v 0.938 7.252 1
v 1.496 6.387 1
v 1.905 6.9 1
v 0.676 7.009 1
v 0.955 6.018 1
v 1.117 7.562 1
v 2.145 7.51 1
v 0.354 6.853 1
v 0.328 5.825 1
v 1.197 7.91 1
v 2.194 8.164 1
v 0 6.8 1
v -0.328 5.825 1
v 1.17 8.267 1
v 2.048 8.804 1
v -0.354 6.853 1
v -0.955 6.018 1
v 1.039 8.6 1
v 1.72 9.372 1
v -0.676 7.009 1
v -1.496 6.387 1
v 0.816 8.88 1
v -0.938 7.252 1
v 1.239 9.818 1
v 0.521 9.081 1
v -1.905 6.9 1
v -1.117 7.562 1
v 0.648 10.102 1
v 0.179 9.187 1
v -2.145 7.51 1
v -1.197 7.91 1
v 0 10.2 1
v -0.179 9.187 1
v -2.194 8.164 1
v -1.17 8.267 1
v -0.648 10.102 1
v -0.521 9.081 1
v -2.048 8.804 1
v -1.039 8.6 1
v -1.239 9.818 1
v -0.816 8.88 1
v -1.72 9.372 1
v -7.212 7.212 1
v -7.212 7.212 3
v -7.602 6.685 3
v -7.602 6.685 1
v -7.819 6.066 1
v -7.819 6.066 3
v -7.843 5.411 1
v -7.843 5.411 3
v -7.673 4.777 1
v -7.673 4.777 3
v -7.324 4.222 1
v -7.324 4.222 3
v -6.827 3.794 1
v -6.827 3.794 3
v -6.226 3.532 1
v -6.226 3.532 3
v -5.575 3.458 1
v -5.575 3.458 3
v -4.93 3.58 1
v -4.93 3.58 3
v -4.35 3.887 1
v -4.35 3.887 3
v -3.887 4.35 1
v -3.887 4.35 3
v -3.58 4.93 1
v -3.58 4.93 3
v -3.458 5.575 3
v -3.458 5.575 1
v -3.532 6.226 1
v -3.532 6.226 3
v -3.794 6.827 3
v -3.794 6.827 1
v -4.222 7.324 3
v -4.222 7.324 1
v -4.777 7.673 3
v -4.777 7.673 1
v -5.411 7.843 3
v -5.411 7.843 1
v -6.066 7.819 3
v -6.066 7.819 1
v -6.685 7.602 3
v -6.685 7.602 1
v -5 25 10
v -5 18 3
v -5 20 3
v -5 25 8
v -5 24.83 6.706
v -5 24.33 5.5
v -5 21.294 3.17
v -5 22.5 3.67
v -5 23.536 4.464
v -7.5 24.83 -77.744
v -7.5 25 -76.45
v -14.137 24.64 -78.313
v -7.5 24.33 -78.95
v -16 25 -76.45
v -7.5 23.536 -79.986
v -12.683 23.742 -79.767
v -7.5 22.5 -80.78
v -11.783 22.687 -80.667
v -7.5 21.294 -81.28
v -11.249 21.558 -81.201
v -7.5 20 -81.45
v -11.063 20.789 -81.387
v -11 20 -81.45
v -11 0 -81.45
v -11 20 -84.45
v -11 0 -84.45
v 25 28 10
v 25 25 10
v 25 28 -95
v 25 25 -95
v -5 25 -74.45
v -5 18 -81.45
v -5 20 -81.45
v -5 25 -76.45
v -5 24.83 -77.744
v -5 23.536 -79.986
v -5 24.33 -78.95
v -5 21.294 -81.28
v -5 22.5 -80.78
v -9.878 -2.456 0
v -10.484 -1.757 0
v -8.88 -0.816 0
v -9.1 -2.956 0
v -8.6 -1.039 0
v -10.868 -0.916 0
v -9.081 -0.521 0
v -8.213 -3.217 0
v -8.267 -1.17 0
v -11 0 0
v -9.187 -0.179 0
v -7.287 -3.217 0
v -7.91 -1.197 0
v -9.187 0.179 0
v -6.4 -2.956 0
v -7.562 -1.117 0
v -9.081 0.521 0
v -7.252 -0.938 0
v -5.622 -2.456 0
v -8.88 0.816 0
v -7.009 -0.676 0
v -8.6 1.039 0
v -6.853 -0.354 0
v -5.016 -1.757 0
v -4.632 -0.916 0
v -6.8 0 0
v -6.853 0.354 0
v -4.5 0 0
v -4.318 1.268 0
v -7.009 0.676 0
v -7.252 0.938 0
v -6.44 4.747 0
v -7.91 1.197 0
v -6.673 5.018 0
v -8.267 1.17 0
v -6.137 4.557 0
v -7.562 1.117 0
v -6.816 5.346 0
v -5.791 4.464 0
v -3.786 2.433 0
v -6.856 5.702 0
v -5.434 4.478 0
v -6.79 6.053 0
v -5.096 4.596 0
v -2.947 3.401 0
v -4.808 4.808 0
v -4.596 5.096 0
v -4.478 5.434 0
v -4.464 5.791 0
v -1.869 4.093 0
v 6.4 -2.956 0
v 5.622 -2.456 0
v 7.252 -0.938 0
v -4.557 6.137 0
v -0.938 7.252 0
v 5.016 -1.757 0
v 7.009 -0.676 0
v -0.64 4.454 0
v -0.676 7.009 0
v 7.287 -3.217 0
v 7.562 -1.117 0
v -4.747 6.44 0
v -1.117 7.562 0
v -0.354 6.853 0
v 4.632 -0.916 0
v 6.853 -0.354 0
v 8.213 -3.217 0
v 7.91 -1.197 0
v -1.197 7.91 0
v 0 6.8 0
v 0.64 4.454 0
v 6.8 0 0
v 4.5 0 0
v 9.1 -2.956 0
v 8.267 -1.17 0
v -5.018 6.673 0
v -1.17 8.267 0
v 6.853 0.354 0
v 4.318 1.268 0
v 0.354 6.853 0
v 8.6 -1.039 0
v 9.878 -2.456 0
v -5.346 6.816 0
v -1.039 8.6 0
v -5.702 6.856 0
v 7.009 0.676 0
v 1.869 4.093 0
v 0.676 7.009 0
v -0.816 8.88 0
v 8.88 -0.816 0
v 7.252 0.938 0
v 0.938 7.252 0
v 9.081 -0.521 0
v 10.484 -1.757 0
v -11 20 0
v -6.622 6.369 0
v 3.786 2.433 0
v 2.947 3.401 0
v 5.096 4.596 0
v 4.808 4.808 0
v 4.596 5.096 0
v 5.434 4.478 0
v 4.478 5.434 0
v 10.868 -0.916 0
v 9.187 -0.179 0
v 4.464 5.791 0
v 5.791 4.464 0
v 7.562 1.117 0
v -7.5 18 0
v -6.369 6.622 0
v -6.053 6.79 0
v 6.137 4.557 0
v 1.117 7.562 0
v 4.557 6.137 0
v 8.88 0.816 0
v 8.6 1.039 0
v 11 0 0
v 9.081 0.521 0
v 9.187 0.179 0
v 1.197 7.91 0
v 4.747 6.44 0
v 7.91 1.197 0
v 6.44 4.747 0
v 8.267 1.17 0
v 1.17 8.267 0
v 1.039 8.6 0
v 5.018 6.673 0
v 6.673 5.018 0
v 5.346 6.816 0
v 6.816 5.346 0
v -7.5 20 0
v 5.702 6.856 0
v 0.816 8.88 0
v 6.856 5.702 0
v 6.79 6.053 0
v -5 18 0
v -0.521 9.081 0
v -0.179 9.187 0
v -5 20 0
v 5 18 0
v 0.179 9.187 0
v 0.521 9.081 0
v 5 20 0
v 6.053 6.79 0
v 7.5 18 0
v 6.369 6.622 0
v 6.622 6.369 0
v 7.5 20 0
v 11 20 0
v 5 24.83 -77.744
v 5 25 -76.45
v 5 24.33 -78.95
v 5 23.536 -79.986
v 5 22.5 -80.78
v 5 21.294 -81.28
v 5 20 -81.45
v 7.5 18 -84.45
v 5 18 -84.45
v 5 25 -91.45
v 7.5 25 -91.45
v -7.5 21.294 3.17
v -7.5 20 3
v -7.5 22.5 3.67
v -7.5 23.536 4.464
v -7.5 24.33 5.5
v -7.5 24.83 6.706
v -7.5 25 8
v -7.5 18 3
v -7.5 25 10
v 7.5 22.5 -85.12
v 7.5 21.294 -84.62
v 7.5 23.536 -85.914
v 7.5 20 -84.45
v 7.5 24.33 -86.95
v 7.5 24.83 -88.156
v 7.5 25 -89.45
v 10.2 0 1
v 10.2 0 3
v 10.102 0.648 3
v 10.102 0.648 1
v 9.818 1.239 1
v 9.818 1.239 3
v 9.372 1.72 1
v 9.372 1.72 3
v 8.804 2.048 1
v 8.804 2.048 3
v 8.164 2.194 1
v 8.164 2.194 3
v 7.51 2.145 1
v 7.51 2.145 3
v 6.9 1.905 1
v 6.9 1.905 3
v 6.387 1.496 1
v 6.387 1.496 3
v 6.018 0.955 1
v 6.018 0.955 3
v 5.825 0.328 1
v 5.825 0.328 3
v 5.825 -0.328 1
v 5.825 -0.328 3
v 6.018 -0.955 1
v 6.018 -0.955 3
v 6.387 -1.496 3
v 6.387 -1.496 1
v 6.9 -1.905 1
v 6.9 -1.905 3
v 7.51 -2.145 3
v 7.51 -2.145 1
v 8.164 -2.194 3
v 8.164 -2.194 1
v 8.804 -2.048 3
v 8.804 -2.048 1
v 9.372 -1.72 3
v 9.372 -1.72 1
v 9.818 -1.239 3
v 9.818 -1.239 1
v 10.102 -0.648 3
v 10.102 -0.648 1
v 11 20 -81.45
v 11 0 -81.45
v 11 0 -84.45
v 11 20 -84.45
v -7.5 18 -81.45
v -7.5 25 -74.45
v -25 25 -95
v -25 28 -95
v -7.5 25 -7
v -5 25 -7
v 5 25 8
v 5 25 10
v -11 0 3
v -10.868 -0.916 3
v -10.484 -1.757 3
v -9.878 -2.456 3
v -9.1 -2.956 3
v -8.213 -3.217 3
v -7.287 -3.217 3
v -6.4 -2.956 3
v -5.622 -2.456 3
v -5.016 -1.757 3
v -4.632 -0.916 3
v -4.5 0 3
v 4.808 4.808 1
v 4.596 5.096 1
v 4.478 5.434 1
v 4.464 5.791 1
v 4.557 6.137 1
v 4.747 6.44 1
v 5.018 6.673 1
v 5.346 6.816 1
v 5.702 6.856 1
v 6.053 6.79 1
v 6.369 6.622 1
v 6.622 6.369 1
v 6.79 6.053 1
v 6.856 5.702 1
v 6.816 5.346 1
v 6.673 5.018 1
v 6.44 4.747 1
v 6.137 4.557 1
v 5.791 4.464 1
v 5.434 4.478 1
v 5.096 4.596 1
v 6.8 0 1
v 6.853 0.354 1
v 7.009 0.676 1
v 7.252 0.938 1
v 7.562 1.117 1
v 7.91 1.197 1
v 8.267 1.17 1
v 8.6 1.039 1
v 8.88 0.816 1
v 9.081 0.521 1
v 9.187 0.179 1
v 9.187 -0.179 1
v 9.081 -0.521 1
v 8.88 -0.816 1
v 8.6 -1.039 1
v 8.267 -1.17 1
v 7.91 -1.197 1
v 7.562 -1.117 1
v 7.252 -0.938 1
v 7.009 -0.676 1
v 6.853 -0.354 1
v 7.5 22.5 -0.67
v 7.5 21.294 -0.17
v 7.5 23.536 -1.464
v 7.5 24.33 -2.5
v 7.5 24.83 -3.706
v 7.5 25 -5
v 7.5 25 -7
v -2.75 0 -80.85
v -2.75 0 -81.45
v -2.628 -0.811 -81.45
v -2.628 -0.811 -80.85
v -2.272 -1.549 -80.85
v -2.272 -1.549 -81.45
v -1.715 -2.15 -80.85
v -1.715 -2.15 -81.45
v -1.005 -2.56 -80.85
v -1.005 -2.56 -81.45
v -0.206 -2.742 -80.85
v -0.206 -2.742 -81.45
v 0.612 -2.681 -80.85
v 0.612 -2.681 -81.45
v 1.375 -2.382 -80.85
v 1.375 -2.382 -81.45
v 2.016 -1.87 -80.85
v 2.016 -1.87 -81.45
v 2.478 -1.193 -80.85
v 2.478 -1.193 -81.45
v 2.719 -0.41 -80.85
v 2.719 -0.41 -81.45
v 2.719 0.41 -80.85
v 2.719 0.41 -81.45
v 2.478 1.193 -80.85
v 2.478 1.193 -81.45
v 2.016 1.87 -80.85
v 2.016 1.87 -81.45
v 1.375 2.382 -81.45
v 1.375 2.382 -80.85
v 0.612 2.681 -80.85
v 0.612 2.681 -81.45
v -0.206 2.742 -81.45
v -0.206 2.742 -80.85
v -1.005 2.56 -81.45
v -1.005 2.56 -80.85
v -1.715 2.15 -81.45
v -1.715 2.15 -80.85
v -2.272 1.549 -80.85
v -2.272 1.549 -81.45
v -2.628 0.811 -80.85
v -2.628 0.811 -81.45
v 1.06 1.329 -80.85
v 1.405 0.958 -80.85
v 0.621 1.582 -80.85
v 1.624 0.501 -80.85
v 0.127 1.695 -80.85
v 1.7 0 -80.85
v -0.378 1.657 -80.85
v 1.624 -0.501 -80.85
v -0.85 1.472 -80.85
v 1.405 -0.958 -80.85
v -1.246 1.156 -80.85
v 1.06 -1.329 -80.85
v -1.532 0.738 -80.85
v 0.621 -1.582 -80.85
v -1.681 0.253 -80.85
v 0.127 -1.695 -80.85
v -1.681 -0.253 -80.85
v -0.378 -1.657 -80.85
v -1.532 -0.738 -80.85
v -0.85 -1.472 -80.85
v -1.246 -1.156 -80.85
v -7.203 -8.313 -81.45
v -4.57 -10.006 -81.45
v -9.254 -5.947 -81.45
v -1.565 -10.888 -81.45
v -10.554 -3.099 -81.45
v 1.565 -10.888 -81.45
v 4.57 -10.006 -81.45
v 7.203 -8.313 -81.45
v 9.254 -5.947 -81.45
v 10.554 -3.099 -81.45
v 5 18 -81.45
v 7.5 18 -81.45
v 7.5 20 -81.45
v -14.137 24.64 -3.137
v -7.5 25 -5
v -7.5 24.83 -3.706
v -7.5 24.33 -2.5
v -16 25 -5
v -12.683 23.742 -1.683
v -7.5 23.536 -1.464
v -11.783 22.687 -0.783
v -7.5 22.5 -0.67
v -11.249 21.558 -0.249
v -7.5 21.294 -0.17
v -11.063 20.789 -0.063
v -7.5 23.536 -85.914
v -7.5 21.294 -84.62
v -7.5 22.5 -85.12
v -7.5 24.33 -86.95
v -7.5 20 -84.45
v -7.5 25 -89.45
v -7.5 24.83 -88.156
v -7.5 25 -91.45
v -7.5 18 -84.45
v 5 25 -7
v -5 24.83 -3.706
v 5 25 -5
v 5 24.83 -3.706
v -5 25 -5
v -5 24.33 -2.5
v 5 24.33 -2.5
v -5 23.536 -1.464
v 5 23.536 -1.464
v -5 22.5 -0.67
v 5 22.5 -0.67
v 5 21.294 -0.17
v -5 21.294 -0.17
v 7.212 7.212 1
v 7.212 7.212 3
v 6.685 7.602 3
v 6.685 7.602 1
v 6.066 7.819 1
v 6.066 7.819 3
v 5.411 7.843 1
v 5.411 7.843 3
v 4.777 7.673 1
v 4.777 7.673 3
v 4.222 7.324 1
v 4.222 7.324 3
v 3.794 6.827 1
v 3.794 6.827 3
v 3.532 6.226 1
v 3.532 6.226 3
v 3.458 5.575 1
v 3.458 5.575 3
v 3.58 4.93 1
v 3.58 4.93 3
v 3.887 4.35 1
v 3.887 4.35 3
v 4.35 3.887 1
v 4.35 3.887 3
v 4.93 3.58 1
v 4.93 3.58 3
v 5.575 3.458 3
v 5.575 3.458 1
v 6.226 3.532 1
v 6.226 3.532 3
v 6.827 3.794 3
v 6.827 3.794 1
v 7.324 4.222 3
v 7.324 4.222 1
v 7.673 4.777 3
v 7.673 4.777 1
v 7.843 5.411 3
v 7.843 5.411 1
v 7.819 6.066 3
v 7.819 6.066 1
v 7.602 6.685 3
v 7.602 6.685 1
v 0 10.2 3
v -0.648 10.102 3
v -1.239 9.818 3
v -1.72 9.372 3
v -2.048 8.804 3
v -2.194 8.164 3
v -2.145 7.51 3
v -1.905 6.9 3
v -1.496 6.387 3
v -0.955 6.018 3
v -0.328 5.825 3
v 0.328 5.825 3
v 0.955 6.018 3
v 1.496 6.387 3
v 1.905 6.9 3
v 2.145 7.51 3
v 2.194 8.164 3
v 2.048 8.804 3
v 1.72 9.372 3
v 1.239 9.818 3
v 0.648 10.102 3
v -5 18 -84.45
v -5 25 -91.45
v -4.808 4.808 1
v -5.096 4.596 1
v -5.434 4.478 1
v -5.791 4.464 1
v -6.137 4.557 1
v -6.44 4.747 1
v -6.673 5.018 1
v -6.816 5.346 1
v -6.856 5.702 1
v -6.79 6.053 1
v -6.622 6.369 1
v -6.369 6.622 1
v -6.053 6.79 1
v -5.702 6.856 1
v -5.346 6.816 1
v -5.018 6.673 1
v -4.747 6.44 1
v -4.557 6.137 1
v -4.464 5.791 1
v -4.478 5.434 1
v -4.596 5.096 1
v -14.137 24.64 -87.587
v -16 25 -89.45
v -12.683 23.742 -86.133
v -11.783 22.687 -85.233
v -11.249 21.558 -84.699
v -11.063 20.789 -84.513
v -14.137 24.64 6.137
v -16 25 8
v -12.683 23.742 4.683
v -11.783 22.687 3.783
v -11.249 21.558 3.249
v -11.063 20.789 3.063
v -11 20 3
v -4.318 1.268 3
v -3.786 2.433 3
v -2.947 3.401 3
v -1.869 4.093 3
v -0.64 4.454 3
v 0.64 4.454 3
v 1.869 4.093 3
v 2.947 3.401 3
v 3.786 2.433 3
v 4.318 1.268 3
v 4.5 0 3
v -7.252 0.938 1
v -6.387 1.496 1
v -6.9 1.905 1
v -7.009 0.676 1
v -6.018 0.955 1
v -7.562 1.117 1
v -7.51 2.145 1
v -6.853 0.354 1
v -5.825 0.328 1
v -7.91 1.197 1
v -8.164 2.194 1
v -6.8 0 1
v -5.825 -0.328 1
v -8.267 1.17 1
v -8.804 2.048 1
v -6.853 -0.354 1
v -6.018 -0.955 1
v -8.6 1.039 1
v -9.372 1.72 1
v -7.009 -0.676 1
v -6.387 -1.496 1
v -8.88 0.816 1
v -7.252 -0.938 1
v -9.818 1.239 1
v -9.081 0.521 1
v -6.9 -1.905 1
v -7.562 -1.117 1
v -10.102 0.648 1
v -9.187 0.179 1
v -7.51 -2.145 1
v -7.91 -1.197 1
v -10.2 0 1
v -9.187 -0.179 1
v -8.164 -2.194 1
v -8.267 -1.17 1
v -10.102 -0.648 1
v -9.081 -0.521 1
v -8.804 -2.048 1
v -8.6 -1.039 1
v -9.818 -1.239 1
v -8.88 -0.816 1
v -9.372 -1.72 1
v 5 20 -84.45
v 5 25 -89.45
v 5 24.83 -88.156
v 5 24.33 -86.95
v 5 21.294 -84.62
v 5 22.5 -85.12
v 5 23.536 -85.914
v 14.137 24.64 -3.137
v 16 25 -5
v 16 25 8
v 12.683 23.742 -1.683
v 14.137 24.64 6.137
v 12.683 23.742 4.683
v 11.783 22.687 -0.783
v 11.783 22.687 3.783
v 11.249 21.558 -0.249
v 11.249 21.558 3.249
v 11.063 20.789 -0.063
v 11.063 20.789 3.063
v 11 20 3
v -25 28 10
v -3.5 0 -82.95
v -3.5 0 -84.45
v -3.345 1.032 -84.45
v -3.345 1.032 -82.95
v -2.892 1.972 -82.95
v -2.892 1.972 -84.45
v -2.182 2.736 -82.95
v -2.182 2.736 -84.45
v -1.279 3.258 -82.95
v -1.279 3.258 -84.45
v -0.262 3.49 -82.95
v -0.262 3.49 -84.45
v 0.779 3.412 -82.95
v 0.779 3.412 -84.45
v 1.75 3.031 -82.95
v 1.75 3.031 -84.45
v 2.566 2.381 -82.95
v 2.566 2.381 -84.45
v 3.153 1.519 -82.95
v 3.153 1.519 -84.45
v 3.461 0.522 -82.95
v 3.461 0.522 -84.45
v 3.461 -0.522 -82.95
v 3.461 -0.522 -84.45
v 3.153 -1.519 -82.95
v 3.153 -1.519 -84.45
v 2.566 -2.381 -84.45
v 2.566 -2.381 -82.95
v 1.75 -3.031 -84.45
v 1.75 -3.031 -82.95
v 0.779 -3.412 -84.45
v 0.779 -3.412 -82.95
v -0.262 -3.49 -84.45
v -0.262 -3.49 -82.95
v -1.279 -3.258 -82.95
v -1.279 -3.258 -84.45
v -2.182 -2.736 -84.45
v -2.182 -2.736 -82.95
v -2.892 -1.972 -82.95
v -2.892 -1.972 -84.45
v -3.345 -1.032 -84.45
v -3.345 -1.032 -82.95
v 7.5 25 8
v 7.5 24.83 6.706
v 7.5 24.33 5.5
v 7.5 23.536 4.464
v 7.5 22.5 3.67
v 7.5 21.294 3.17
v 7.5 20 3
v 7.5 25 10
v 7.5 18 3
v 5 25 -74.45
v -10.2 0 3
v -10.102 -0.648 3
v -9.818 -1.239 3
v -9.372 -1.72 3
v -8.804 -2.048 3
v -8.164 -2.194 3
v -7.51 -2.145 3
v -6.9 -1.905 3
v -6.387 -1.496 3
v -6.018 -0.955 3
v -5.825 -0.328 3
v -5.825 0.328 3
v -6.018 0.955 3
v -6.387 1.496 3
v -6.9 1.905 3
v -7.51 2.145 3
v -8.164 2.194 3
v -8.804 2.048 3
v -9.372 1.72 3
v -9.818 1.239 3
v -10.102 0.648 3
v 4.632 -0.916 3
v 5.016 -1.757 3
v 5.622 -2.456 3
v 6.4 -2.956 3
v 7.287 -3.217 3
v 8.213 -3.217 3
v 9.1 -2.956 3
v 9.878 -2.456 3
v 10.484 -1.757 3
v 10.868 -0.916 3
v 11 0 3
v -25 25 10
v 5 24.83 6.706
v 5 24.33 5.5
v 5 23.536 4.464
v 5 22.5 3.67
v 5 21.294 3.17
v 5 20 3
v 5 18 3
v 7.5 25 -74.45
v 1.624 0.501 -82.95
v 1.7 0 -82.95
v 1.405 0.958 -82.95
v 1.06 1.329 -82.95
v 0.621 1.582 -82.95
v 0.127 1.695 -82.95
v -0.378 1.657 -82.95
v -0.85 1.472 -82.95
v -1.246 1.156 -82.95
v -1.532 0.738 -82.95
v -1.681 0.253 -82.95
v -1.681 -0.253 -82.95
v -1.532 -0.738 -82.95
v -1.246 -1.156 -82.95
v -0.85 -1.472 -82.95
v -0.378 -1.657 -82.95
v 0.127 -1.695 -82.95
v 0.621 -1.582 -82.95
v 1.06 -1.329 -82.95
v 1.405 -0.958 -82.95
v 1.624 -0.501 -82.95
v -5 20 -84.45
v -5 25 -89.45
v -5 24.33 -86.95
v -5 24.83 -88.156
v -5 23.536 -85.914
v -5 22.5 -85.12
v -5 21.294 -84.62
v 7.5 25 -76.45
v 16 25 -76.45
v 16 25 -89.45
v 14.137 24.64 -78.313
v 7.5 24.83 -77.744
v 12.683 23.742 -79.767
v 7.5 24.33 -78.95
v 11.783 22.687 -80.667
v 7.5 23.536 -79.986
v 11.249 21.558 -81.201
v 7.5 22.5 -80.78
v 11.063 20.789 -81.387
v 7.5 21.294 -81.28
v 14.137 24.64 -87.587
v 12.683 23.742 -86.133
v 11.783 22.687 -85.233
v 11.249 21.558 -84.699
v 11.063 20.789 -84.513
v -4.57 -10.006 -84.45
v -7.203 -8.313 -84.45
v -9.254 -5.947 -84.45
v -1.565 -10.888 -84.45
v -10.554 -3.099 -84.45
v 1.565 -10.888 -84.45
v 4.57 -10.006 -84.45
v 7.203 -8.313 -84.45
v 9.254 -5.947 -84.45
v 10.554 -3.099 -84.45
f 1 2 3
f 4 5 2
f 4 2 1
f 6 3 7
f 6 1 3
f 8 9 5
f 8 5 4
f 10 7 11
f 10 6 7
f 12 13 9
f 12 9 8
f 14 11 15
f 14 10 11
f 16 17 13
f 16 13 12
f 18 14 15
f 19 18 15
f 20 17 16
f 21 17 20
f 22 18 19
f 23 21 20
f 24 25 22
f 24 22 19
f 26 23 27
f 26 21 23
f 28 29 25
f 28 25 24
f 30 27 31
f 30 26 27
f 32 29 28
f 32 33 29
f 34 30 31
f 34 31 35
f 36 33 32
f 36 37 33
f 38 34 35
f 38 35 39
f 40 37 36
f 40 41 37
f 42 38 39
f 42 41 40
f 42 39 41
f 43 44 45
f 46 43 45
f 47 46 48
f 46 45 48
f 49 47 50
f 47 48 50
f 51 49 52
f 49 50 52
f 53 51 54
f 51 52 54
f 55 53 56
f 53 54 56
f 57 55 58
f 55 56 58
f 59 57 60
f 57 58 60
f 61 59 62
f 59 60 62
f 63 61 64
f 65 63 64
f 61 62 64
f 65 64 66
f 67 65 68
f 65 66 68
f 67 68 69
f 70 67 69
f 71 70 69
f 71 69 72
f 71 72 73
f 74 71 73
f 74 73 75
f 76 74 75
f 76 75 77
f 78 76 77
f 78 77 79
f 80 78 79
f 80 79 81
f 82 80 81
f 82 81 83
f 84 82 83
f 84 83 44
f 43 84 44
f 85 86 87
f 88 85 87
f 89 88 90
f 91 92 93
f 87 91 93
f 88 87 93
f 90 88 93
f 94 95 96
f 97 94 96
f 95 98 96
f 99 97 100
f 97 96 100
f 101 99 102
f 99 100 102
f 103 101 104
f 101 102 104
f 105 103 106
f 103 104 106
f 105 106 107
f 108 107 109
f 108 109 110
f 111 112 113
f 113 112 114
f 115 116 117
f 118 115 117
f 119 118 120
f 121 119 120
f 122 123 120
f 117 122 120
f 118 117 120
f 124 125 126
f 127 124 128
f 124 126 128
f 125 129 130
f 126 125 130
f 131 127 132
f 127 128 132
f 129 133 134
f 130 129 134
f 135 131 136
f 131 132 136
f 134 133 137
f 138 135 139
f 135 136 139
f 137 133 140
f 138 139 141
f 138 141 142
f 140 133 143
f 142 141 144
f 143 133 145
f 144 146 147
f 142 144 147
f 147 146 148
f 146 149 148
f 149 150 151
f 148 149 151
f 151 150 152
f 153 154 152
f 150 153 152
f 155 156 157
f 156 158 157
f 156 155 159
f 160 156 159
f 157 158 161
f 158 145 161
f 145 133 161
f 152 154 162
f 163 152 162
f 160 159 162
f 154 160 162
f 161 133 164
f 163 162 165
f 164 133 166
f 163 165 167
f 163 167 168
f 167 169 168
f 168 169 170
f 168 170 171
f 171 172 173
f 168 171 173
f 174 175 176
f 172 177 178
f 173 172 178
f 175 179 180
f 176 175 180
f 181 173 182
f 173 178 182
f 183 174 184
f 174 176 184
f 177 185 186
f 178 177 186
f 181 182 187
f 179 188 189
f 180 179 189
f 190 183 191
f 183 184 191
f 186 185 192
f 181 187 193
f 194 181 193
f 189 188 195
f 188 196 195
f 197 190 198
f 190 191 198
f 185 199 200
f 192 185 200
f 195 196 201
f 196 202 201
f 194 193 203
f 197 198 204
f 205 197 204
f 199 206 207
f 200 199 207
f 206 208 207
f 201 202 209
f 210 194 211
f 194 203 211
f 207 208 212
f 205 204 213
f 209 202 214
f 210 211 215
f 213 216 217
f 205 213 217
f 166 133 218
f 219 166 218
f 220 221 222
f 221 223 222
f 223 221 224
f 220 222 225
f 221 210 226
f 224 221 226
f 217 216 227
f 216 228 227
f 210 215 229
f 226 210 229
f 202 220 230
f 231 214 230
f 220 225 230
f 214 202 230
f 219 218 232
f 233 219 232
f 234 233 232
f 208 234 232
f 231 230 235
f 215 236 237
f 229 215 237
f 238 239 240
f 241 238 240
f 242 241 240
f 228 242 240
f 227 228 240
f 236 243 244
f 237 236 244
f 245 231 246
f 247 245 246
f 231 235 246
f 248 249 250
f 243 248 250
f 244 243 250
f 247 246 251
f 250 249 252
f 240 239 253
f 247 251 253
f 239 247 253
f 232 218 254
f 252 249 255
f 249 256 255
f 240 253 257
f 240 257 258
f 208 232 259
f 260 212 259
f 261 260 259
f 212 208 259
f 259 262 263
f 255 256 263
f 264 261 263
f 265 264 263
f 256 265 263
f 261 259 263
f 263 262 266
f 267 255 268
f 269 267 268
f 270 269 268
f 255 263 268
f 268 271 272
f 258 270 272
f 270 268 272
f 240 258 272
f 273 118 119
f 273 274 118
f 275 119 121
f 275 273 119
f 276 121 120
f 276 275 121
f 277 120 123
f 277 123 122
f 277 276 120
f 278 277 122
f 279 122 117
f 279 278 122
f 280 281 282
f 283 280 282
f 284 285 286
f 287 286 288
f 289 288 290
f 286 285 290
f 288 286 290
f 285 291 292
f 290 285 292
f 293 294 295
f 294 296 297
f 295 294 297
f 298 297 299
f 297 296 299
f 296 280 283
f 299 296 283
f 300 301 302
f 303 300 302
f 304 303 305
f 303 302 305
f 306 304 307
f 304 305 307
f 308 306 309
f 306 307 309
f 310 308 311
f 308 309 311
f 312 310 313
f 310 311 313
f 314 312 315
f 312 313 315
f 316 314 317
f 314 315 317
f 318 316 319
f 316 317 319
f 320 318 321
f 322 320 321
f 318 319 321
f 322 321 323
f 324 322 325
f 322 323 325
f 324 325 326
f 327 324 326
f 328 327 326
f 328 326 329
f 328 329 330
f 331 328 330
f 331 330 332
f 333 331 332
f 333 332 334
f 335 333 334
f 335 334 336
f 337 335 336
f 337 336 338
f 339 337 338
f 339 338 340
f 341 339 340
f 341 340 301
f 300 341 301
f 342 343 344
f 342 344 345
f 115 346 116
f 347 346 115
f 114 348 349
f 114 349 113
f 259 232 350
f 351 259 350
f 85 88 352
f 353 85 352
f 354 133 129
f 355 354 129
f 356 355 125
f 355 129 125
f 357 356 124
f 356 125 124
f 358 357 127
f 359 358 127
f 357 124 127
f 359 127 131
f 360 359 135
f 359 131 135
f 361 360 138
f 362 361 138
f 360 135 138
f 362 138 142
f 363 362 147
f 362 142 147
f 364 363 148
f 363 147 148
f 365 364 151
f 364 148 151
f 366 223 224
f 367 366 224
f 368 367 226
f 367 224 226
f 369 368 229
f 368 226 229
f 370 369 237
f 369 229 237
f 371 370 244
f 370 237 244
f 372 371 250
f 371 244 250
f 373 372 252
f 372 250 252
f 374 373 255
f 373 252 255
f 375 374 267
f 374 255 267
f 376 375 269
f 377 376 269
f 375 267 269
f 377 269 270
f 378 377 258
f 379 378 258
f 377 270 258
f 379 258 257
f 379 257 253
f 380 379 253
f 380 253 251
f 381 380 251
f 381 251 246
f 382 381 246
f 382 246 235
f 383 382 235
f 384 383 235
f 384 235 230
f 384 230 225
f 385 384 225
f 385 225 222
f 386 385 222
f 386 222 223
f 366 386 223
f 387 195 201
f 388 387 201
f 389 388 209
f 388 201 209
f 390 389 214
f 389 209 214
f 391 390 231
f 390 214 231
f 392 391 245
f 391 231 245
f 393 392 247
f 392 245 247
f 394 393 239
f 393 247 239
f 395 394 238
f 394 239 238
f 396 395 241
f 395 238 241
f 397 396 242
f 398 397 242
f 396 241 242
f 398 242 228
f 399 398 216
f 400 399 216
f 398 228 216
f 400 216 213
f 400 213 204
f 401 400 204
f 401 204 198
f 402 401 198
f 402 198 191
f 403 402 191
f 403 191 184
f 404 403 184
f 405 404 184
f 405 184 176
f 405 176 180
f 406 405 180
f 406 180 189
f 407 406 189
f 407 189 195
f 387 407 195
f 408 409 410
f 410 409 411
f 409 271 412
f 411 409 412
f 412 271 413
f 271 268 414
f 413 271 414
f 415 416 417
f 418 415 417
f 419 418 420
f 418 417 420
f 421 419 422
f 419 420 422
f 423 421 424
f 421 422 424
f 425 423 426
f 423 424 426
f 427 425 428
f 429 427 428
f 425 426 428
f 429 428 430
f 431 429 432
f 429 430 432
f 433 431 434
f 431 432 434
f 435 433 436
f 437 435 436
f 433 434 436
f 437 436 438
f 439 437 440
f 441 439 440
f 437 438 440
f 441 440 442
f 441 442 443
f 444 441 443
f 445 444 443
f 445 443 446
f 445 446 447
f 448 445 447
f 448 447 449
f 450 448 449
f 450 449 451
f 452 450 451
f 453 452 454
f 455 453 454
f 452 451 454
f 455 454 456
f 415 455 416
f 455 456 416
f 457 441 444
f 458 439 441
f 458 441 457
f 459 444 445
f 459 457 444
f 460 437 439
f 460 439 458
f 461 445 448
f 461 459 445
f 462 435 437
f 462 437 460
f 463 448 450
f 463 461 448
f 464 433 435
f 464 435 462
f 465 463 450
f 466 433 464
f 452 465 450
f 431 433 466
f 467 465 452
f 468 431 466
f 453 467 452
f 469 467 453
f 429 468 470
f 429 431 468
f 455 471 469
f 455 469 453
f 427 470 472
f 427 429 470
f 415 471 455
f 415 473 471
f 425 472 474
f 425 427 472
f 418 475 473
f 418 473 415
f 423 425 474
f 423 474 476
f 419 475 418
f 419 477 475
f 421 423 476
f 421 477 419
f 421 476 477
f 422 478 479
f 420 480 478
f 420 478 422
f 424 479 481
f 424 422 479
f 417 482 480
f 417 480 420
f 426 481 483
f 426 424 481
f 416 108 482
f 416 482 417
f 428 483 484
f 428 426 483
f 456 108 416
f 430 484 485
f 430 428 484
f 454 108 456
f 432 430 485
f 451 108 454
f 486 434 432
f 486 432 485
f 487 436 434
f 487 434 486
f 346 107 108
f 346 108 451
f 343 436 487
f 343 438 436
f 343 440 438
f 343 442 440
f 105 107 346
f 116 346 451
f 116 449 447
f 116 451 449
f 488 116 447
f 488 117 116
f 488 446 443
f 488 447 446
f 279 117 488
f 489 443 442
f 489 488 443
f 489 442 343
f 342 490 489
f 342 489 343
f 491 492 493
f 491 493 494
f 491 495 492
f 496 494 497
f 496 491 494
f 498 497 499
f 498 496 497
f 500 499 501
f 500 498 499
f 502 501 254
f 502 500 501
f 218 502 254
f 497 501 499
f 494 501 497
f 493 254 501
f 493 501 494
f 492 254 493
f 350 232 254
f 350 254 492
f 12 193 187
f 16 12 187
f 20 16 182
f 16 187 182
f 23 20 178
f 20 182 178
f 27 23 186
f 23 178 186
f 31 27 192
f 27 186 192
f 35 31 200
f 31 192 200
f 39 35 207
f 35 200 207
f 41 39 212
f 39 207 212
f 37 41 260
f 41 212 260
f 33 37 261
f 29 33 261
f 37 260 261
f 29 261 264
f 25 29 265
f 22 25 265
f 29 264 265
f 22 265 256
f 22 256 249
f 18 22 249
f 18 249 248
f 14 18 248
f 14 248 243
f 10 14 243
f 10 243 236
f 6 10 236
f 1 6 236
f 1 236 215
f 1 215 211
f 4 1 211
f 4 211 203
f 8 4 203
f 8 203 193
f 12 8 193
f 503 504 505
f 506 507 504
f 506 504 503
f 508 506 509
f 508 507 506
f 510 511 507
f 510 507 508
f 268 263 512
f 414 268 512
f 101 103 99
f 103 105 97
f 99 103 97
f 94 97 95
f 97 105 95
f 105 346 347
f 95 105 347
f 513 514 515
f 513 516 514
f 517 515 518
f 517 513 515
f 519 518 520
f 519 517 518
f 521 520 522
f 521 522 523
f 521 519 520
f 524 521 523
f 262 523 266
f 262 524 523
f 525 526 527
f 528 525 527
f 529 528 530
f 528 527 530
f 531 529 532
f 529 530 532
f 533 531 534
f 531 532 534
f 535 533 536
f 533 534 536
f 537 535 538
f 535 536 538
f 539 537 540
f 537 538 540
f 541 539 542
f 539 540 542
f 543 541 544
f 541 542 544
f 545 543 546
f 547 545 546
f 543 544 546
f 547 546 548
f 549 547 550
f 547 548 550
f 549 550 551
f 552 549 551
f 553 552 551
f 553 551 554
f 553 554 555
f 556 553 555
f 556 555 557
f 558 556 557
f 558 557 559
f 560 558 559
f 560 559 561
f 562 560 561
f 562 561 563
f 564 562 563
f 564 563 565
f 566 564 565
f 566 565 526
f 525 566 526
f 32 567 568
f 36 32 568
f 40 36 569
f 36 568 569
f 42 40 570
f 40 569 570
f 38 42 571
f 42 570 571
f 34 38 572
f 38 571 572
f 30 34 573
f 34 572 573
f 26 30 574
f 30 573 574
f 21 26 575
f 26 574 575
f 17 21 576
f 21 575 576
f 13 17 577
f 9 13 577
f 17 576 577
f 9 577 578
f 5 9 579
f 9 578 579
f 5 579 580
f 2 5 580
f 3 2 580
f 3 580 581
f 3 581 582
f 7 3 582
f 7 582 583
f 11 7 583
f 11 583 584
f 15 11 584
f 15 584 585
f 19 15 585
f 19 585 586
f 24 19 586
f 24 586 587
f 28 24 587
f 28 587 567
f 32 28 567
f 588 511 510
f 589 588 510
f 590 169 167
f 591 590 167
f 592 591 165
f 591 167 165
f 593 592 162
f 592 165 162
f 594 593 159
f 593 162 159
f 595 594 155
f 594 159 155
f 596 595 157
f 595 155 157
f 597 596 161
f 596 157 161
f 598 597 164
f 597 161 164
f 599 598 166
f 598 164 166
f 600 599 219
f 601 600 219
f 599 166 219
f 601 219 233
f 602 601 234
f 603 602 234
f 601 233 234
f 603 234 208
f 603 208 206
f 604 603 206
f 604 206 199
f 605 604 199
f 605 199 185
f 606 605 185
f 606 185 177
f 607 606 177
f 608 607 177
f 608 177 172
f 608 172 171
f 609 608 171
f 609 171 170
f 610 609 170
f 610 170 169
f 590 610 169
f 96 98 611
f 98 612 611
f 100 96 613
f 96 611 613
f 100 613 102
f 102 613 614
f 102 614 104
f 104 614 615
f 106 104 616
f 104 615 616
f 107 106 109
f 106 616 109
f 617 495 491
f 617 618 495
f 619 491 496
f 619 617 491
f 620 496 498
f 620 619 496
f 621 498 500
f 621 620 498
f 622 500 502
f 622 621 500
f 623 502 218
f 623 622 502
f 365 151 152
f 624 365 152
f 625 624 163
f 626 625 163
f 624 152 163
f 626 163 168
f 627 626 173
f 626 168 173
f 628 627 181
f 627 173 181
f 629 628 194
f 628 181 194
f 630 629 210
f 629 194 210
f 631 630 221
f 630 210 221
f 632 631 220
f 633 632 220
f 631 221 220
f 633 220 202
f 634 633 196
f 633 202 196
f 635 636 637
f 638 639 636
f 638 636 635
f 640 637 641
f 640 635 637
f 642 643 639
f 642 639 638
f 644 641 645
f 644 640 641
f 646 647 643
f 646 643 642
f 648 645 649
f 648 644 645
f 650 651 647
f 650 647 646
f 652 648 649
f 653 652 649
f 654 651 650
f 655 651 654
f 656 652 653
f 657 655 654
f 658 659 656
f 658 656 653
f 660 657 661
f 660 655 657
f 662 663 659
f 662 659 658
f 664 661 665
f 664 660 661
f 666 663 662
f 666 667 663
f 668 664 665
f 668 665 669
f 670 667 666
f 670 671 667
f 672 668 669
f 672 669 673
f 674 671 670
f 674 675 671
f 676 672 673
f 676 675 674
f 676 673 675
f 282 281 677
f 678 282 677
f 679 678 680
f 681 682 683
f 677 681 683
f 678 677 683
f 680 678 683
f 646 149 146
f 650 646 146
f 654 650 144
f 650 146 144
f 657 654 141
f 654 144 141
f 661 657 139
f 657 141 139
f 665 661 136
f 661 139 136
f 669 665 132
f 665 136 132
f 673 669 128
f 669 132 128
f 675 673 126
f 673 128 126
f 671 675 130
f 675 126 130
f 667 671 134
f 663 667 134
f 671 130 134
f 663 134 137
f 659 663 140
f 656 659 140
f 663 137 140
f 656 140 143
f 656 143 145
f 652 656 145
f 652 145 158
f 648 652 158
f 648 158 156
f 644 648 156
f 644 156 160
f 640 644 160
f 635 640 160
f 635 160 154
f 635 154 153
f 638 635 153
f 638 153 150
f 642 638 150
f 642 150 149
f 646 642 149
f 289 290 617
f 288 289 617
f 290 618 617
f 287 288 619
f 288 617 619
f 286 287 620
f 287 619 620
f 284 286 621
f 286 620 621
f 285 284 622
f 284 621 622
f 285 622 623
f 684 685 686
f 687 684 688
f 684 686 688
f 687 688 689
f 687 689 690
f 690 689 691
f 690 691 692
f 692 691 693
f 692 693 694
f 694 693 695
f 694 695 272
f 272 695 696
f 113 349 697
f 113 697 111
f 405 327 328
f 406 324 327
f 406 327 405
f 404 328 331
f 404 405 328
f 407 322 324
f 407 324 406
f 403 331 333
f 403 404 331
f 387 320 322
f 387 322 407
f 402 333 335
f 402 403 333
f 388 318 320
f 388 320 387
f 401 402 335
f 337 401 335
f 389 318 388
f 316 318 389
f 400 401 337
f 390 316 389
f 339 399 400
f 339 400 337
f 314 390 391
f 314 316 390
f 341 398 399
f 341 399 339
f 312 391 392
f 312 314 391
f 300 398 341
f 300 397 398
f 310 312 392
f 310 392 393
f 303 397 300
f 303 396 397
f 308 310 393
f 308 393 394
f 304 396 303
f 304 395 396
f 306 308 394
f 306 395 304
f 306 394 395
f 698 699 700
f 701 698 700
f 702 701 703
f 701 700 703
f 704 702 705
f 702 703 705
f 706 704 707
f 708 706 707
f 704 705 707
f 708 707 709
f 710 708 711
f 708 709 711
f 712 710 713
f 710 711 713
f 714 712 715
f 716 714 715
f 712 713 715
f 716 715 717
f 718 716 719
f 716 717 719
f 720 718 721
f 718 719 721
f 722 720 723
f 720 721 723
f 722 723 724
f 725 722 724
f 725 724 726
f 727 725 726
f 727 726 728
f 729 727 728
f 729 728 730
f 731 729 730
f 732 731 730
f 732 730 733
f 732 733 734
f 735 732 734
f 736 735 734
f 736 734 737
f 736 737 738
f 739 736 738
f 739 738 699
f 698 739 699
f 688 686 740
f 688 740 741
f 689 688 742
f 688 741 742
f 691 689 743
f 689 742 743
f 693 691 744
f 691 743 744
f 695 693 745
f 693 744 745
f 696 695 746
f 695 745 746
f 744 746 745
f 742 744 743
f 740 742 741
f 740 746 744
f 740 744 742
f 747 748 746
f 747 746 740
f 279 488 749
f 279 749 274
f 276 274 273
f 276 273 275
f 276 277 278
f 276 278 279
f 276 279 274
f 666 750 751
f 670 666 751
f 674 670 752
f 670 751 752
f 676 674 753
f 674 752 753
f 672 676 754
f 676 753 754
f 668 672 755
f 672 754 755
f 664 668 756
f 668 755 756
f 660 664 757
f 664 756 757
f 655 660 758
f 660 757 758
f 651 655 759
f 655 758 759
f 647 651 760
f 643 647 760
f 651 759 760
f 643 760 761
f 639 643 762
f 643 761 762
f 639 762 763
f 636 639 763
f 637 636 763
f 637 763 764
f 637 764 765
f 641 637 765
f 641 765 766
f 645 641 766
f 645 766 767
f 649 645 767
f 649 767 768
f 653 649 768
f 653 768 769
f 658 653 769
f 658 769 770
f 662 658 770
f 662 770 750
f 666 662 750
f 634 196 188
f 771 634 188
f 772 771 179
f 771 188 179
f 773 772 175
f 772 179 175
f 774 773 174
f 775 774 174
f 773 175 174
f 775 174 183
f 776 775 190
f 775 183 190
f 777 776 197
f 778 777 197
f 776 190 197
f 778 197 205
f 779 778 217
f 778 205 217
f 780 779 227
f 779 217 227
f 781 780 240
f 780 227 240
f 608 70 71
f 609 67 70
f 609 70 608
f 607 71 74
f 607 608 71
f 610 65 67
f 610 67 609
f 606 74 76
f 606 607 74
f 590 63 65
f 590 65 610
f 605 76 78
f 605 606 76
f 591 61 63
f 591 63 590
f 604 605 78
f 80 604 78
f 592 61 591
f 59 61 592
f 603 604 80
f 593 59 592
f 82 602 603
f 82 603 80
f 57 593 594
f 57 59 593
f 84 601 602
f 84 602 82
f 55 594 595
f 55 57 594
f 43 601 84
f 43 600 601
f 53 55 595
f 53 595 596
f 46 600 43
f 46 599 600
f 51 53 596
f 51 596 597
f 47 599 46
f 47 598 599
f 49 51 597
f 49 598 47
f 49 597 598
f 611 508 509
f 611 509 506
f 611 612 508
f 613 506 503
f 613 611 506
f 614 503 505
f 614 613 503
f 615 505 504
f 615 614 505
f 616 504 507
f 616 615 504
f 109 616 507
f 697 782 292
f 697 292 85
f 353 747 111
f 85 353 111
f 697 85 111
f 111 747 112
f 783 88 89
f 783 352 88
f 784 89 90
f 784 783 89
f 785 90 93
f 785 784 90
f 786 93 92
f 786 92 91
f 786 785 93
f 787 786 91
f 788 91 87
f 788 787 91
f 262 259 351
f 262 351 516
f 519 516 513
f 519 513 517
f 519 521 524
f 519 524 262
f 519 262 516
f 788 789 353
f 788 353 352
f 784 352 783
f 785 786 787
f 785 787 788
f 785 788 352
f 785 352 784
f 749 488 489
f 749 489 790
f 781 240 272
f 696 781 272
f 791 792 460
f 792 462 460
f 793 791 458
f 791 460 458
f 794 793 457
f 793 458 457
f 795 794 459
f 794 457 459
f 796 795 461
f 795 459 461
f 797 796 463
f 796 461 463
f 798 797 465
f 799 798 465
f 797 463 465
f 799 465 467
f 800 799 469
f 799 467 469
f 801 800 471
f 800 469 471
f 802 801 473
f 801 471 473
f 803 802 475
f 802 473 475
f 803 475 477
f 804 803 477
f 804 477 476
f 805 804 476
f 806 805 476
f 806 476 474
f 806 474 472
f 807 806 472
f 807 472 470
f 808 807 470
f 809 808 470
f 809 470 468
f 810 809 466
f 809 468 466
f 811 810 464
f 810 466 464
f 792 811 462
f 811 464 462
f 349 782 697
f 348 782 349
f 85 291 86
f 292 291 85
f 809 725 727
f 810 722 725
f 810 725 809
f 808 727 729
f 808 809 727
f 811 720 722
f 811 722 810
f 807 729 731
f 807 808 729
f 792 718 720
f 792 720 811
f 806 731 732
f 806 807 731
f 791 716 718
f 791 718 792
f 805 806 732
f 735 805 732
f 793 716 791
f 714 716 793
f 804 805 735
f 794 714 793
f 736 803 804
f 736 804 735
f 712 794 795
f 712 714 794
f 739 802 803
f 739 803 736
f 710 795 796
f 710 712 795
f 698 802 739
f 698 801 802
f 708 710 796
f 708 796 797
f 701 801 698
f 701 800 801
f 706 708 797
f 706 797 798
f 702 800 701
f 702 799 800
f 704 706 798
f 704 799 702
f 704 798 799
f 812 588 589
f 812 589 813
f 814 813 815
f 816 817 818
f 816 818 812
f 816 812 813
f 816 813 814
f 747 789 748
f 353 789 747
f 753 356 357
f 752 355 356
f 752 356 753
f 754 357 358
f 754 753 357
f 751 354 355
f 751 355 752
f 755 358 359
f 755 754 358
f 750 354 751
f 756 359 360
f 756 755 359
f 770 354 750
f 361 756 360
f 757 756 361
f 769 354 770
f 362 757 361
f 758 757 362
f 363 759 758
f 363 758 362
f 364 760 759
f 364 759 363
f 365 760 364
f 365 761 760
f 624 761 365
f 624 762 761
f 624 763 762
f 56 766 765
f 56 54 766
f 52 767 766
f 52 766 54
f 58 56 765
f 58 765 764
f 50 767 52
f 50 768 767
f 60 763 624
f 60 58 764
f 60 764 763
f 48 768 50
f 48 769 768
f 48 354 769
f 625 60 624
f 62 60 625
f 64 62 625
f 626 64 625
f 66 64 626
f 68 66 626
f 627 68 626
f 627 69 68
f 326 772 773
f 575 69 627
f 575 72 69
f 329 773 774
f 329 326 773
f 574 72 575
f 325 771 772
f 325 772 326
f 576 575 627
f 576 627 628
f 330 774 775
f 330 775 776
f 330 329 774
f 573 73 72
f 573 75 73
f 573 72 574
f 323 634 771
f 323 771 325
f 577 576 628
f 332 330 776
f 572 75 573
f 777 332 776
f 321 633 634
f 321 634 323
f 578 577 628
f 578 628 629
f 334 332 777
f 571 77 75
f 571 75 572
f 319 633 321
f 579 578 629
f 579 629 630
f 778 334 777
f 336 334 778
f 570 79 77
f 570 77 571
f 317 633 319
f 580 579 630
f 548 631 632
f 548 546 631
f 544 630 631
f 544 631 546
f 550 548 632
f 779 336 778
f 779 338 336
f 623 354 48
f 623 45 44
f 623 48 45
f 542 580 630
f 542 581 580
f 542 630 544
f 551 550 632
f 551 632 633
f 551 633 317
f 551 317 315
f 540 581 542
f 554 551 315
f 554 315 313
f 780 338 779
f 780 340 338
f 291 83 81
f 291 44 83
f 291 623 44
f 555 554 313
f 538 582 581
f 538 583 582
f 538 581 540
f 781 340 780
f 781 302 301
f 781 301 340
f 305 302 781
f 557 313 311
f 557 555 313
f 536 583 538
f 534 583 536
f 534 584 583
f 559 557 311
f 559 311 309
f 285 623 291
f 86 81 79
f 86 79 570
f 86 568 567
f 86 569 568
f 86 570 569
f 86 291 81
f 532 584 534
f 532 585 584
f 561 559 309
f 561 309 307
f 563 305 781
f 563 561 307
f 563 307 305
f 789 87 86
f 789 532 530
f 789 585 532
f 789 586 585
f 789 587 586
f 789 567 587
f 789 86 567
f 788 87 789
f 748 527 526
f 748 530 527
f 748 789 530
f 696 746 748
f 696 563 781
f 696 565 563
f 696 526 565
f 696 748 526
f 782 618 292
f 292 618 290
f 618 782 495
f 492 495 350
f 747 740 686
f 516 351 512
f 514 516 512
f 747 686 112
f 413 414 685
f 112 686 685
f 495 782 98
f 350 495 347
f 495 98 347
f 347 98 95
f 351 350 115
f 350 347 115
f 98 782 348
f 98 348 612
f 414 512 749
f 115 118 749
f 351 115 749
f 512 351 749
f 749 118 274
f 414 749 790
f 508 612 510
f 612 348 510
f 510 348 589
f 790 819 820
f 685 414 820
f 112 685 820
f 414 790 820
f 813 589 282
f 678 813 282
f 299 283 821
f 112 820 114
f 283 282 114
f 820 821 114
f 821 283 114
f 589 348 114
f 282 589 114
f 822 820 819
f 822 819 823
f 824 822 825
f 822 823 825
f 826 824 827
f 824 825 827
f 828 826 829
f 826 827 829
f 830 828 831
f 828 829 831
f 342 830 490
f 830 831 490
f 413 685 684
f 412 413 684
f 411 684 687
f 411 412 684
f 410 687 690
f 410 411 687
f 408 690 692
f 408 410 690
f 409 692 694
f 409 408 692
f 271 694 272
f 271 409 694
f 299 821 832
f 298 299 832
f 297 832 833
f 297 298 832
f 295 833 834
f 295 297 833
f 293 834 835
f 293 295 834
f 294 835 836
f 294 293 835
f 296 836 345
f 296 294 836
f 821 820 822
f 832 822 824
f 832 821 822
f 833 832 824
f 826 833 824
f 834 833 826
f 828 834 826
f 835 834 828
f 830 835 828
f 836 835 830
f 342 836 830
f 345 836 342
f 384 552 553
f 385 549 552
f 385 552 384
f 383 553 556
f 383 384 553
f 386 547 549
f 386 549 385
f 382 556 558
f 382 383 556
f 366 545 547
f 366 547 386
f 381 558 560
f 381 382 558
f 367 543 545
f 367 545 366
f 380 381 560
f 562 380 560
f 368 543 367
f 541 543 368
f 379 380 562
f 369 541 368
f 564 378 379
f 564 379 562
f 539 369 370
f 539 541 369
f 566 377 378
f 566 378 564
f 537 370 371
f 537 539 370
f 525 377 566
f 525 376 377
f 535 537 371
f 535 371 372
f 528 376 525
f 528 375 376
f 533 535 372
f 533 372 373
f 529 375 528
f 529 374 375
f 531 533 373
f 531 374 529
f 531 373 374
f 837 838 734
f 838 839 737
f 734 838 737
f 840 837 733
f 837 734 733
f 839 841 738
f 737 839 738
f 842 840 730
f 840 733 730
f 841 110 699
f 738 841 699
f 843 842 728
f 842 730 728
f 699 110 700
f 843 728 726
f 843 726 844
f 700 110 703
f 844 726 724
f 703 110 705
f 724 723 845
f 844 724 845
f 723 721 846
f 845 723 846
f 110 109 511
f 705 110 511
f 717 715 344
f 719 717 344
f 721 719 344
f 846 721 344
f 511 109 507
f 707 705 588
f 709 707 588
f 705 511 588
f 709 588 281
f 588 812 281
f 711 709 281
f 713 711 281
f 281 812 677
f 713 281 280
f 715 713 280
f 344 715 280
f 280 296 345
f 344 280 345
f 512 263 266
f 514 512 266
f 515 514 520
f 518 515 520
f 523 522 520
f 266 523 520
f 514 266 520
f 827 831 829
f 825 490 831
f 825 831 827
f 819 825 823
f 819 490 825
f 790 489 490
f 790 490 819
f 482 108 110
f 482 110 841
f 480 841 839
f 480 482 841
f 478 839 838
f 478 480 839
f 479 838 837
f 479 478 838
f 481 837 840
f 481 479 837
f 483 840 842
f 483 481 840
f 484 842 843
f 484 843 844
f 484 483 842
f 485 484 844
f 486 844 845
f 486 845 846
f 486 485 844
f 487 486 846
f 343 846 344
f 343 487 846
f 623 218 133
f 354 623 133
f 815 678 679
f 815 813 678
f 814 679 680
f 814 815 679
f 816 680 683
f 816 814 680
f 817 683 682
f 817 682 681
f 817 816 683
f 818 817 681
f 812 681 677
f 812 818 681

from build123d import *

# Parameters (mm, degrees)
RESSALTO_EXTRUS_O1_DEPTH                            = 3
ESBO_O2_W                                           = 50
ESBO_O2_H                                           = 105
RESSALTO_EXTRUS_O2_DEPTH                            = 3
RESSALTO_EXTRUS_O3_DEPTH                            = 3
REBAIXO_PARA_SHCS_M21_D                             = 2.4
REBAIXO_PARA_SHCS_M21_DEPTH                         = 3
REBAIXO_PARA_SHCS_M21_CBORE_D                       = 4.4
REBAIXO_PARA_SHCS_M21_CBORE_DEPTH                   = 2
PADR_OCIRCULAR1_COUNT                               = 5
PADR_OCIRCULAR1_ANGLE                               = 180
NERVURA1_REACH                                      = 104.147
ESBO_O6_WALL_W                                      = 216.193400866
ESBO_O6_WALL_H                                      = 15
CORTE_EXTRUS_O1_REACH                               = 106.943
ESBO_O7_W                                           = 10
ESBO_O7_H                                           = 7
NERVURA7_REACH                                      = 104.147
ESBO_O8_WALL_W                                      = 216.193400866
ESBO_O8_WALL_H                                      = 15
CORTE_EXTRUS_O2_REACH                               = 104.147
ESBO_O9_W                                           = 10
ESBO_O9_H                                           = 7
PADR_O_LINEAR1_COUNT                                = 2
PADR_O_LINEAR1_PITCH                                = 84.45
ESBO_O10_R                                          = 2.75
RESSALTO_EXTRUS_O4_DEPTH                            = 0.6
REBAIXO_PARA_PARAFUSO_COM_CABE_A_PANELA_D           = 3.4
REBAIXO_PARA_PARAFUSO_COM_CABE_A_PANELA_CBORE_D     = 7
REBAIXO_PARA_PARAFUSO_COM_CABE_A_PANELA_CBORE_DEPTH = 1.5
FILETE1_R                                           = 5


with BuildPart() as part:
    # Esboço1 → Ressalto-extrusão1 (new body)
    with BuildSketch(Plane.XY):
        with BuildLine():
            Line((11, 0), (11, 25))
            Line((11, 25), (-11, 25))
            Line((-11, 25), (-11, 0))
            ThreePointArc((-11, 0), (-7.75, -3.25), (-4.5, 0))
            ThreePointArc((-4.5, 0), (0, 4.5), (4.5, 0))
            ThreePointArc((4.5, 0), (7.75, -3.25), (11, 0))
        make_face()
    extrude(amount=RESSALTO_EXTRUS_O1_DEPTH)

    # Esboço2 → Ressalto-extrusão2 (add)
    with BuildSketch(Plane(origin=(0, 25, 0), x_dir=(1, 0, 0), z_dir=(0, 1, 0))):
        with Locations((0, 42.5)):
            Rectangle(ESBO_O2_W, ESBO_O2_H)
    extrude(amount=RESSALTO_EXTRUS_O2_DEPTH)

    # Esboço3 → Ressalto-extrusão3 (add)
    with BuildSketch(Plane(origin=(0, 0, -81.45), x_dir=(-1, 0, 0), z_dir=(0, 0, -1))):
        with BuildLine():
            Line((-11, 0), (-11, 25))
            Line((-11, 25), (11, 25))
            Line((11, 25), (11, 0))
            ThreePointArc((11, 0), (0, -11), (-11, 0))
        make_face()
    extrude(amount=RESSALTO_EXTRUS_O3_DEPTH)

    # Rebaixo para SHCS M21
    with Locations(Plane.XY.offset(3)):
        with Locations((8, 0)):
            rebaixo_para_shcs_m21 = CounterBoreHole(REBAIXO_PARA_SHCS_M21_D / 2, REBAIXO_PARA_SHCS_M21_CBORE_D / 2, REBAIXO_PARA_SHCS_M21_CBORE_DEPTH, depth=REBAIXO_PARA_SHCS_M21_DEPTH)

    # PadrãoCircular1: Rebaixo para SHCS M21 ×5 about axis
    padr_ocircular1_axis = Axis((0, 0, 0), (0, 0, 1))
    for i in range(1, PADR_OCIRCULAR1_COUNT):
        add(rebaixo_para_shcs_m21.rotate(padr_ocircular1_axis, i * PADR_OCIRCULAR1_ANGLE / (PADR_OCIRCULAR1_COUNT - 1)), mode=Mode.SUBTRACT)

    # Esboço6 wall → Nervura1 (add, up to next)
    with BuildSketch(Plane(origin=(0, 21.5, 6.5), x_dir=(0, 0.707106781187, 0.707106781187), z_dir=(0, -0.707106781187, 0.707106781187)), mode=Mode.PRIVATE) as nervura1_sk1:
        Rectangle(ESBO_O6_WALL_W, ESBO_O6_WALL_H)
    nervura1_tool1 = extrude(nervura1_sk1.sketch, amount=-NERVURA1_REACH, mode=Mode.PRIVATE) - part.part
    nervura1 = nervura1_tool1.solids().sort_by_distance((0, 21.5, 6.5))[0]
    add(nervura1)

    # Corte-extrusão1: up to this face of the body (flat: up to its plane)
    corte_extrus_o1_end = Plane(part.part.faces().sort_by_distance((0, 21.5, 6.5))[0])
    # Esboço7 → Corte-extrusão1 (cut, up to the picked face)
    with BuildSketch(Plane.XY.offset(3), mode=Mode.PRIVATE) as corte_extrus_o1_sk1:
        with Locations((0, 21.5)):
            Rectangle(ESBO_O7_W, ESBO_O7_H)
    corte_extrus_o1_tool1 = split(extrude(corte_extrus_o1_sk1.sketch, amount=CORTE_EXTRUS_O1_REACH, mode=Mode.PRIVATE), bisect_by=corte_extrus_o1_end, keep=Keep.BOTH, mode=Mode.PRIVATE)
    corte_extrus_o1 = corte_extrus_o1_tool1.solids().sort_by(Axis((0, 21.5, 3), (0, 0, 1)))[0]
    add(corte_extrus_o1, mode=Mode.SUBTRACT)

    # Esboço8 wall → Nervura7 (add, up to next)
    with BuildSketch(Plane(origin=(0, 21.5, -3.5), x_dir=(0, 0.707106781187, -0.707106781187), z_dir=(0, 0.707106781187, 0.707106781187)), mode=Mode.PRIVATE) as nervura7_sk1:
        Rectangle(ESBO_O8_WALL_W, ESBO_O8_WALL_H)
    nervura7_tool1 = extrude(nervura7_sk1.sketch, amount=NERVURA7_REACH, mode=Mode.PRIVATE) - part.part
    nervura7 = nervura7_tool1.solids().sort_by_distance((0, 21.5, -3.5))[0]
    add(nervura7)

    # Corte-extrusão2: up to this face of the body (flat: up to its plane)
    corte_extrus_o2_end = Plane(part.part.faces().sort_by_distance((0, 21.5, -3.5))[0])
    # Esboço9 → Corte-extrusão2 (cut, up to the picked face)
    with BuildSketch(Plane(origin=(0, 0, 0), x_dir=(-1, 0, 0), z_dir=(0, 0, -1)), mode=Mode.PRIVATE) as corte_extrus_o2_sk1:
        with Locations((0, 21.5)):
            Rectangle(ESBO_O9_W, ESBO_O9_H)
    corte_extrus_o2_tool1 = split(extrude(corte_extrus_o2_sk1.sketch, amount=CORTE_EXTRUS_O2_REACH, mode=Mode.PRIVATE), bisect_by=corte_extrus_o2_end, keep=Keep.BOTH, mode=Mode.PRIVATE)
    corte_extrus_o2 = corte_extrus_o2_tool1.solids().sort_by(Axis((0, 21.5, 0), (0, 0, -1)))[0]
    add(corte_extrus_o2, mode=Mode.SUBTRACT)

    # Padrão linear1: Nervura1, Corte-extrusão1, Nervura7, Corte-extrusão2 ×2
    with Locations(*[(0, 0, -i * PADR_O_LINEAR1_PITCH) for i in range(1, PADR_O_LINEAR1_COUNT)]):
        add(nervura1)
        add(corte_extrus_o1, mode=Mode.SUBTRACT)
        add(nervura7)
        add(corte_extrus_o2, mode=Mode.SUBTRACT)

    # Esboço10 → Ressalto-extrusão4 (add)
    with BuildSketch(Plane.XY.offset(-81.45)):
        with Locations(Location((0, 0, 0), (0, 0, 180))):
            Circle(ESBO_O10_R)
    extrude(amount=RESSALTO_EXTRUS_O4_DEPTH)

    # Rebaixo para parafuso com cabeça panela de M31 (through all)
    with Locations(Plane(origin=(0, 0, -84.45), x_dir=(-1, 0, 0), z_dir=(0, 0, -1))):
        with Locations((0, 0)):
            CounterBoreHole(REBAIXO_PARA_PARAFUSO_COM_CABE_A_PANELA_D / 2, REBAIXO_PARA_PARAFUSO_COM_CABE_A_PANELA_CBORE_D / 2, REBAIXO_PARA_PARAFUSO_COM_CABE_A_PANELA_CBORE_DEPTH)

    # Filete1
    filete1_edges = [part.edges().sort_by_distance(p)[0] for p in [
        (-11, 25, 1.5),
        (11, 25, 1.5),
        (0, 25, 3),
        (9.25, 25, 3),
        (-9.25, 25, 0),
        (0, 25, 0),
        (9.25, 25, -81.45),
        (0, 25, -81.45),
        (9.25, 25, -84.45),
        (0, 25, -84.45),
        (-9.25, 25, -81.45),
        (-11, 25, -82.95),
        (11, 25, -82.95),
        (-9.25, 25, -84.45),
        (9.25, 25, 0),
        (-9.25, 25, 3),
    ]]
    fillet(filete1_edges, radius=FILETE1_R)


solid = part.part
